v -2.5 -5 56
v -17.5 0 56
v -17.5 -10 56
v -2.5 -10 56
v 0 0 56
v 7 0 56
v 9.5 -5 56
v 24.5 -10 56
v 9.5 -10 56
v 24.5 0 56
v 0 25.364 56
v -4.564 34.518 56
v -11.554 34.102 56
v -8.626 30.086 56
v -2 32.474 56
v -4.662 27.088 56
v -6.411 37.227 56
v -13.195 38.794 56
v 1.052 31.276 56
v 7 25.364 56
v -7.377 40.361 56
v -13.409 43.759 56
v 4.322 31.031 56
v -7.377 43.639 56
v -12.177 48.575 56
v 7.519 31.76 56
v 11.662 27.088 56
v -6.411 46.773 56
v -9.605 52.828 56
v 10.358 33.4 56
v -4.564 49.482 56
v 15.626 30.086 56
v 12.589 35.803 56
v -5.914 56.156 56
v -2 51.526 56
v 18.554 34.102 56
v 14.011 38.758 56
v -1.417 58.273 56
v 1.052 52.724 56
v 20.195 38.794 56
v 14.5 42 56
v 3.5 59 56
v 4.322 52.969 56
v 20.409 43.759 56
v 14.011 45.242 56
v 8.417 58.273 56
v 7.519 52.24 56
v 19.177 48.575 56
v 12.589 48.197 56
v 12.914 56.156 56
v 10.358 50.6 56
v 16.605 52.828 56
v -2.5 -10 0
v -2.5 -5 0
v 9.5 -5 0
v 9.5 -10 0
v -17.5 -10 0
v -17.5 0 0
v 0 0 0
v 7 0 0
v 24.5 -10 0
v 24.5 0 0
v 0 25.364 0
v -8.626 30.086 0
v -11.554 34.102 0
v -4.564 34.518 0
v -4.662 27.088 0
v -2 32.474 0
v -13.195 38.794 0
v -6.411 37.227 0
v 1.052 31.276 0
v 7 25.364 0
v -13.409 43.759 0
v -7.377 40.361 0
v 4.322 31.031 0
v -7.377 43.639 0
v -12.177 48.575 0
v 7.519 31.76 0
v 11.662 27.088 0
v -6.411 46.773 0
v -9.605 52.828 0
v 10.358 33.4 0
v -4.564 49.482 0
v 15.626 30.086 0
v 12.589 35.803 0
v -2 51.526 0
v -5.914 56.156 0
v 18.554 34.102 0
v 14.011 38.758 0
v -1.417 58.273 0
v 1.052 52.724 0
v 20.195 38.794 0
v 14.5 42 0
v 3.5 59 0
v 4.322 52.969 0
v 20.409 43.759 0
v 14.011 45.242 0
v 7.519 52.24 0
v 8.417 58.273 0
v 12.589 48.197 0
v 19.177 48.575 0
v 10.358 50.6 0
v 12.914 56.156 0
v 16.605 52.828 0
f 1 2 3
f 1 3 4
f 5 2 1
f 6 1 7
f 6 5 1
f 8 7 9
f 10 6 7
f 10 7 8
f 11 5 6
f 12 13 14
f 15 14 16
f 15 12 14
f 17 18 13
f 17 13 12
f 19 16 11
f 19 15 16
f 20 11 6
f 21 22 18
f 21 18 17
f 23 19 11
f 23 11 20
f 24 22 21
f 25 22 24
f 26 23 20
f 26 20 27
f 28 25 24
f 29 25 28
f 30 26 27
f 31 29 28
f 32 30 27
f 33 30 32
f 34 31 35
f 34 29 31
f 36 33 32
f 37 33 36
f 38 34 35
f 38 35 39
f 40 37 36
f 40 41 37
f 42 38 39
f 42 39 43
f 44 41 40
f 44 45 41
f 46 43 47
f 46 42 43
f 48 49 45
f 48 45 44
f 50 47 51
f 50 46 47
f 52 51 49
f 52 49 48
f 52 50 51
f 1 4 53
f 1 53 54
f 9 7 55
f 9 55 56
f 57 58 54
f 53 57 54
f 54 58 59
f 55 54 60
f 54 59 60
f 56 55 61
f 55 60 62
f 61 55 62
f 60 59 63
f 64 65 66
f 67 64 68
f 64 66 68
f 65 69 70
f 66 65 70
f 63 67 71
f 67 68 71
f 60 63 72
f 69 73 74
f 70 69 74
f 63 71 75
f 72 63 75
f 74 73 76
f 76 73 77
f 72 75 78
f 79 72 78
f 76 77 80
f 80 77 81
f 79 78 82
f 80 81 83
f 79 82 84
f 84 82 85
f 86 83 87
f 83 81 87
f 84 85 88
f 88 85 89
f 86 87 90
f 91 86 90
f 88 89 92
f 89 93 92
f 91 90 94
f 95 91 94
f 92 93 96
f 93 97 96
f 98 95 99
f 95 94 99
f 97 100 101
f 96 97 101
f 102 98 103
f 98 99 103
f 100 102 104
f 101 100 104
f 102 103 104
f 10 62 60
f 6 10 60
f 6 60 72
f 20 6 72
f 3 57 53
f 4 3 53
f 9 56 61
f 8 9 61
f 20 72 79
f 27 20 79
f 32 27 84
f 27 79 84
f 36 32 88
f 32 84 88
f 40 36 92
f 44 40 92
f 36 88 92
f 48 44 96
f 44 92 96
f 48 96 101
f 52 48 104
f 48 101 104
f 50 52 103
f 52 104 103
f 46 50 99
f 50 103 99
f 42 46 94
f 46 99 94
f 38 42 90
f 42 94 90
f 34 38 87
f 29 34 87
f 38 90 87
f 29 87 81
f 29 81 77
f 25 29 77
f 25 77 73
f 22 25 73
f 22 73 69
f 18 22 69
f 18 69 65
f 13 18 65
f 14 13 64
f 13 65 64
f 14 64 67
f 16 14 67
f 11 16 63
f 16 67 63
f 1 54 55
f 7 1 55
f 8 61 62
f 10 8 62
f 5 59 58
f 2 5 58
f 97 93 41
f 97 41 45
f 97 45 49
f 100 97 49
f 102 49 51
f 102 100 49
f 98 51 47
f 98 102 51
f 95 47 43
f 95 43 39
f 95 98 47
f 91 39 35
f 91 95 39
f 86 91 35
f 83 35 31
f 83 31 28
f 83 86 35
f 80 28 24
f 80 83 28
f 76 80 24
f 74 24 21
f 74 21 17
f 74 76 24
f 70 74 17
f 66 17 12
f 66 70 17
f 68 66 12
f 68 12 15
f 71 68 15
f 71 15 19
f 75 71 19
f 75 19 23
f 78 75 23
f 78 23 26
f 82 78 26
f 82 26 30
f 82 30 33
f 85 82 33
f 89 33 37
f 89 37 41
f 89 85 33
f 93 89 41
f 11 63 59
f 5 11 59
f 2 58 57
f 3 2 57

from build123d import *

# Parameters (mm, degrees)
F0_R     = 11
F1_DEPTH = 56


with BuildPart() as f1:
    # F0 (on Top) → F1 (new body)
    with BuildSketch(Plane.XY):
        with BuildLine():
            Line((0, 25.364195), (0, 0))
            Line((0, 0), (-17.5, 0))
            Line((-17.5, 0), (-17.5, -10))
            Line((-17.5, -10), (-2.5, -10))
            Line((-2.5, -10), (-2.5, -5))
            Line((-2.5, -5), (9.5, -5))
            Line((9.5, -5), (9.5, -10))
            Line((9.5, -10), (24.5, -10))
            Line((24.5, -10), (24.5, 0))
            Line((24.5, 0), (7, 0))
            Line((7, 0), (7, 25.364195))
            ThreePointArc((7, 25.364195), (3.5, 59), (0, 25.364195))
        make_face()
        with Locations((3.5, 42)):
            Circle(F0_R, mode=Mode.SUBTRACT)
    extrude(amount=F1_DEPTH)


solid = f1.part
